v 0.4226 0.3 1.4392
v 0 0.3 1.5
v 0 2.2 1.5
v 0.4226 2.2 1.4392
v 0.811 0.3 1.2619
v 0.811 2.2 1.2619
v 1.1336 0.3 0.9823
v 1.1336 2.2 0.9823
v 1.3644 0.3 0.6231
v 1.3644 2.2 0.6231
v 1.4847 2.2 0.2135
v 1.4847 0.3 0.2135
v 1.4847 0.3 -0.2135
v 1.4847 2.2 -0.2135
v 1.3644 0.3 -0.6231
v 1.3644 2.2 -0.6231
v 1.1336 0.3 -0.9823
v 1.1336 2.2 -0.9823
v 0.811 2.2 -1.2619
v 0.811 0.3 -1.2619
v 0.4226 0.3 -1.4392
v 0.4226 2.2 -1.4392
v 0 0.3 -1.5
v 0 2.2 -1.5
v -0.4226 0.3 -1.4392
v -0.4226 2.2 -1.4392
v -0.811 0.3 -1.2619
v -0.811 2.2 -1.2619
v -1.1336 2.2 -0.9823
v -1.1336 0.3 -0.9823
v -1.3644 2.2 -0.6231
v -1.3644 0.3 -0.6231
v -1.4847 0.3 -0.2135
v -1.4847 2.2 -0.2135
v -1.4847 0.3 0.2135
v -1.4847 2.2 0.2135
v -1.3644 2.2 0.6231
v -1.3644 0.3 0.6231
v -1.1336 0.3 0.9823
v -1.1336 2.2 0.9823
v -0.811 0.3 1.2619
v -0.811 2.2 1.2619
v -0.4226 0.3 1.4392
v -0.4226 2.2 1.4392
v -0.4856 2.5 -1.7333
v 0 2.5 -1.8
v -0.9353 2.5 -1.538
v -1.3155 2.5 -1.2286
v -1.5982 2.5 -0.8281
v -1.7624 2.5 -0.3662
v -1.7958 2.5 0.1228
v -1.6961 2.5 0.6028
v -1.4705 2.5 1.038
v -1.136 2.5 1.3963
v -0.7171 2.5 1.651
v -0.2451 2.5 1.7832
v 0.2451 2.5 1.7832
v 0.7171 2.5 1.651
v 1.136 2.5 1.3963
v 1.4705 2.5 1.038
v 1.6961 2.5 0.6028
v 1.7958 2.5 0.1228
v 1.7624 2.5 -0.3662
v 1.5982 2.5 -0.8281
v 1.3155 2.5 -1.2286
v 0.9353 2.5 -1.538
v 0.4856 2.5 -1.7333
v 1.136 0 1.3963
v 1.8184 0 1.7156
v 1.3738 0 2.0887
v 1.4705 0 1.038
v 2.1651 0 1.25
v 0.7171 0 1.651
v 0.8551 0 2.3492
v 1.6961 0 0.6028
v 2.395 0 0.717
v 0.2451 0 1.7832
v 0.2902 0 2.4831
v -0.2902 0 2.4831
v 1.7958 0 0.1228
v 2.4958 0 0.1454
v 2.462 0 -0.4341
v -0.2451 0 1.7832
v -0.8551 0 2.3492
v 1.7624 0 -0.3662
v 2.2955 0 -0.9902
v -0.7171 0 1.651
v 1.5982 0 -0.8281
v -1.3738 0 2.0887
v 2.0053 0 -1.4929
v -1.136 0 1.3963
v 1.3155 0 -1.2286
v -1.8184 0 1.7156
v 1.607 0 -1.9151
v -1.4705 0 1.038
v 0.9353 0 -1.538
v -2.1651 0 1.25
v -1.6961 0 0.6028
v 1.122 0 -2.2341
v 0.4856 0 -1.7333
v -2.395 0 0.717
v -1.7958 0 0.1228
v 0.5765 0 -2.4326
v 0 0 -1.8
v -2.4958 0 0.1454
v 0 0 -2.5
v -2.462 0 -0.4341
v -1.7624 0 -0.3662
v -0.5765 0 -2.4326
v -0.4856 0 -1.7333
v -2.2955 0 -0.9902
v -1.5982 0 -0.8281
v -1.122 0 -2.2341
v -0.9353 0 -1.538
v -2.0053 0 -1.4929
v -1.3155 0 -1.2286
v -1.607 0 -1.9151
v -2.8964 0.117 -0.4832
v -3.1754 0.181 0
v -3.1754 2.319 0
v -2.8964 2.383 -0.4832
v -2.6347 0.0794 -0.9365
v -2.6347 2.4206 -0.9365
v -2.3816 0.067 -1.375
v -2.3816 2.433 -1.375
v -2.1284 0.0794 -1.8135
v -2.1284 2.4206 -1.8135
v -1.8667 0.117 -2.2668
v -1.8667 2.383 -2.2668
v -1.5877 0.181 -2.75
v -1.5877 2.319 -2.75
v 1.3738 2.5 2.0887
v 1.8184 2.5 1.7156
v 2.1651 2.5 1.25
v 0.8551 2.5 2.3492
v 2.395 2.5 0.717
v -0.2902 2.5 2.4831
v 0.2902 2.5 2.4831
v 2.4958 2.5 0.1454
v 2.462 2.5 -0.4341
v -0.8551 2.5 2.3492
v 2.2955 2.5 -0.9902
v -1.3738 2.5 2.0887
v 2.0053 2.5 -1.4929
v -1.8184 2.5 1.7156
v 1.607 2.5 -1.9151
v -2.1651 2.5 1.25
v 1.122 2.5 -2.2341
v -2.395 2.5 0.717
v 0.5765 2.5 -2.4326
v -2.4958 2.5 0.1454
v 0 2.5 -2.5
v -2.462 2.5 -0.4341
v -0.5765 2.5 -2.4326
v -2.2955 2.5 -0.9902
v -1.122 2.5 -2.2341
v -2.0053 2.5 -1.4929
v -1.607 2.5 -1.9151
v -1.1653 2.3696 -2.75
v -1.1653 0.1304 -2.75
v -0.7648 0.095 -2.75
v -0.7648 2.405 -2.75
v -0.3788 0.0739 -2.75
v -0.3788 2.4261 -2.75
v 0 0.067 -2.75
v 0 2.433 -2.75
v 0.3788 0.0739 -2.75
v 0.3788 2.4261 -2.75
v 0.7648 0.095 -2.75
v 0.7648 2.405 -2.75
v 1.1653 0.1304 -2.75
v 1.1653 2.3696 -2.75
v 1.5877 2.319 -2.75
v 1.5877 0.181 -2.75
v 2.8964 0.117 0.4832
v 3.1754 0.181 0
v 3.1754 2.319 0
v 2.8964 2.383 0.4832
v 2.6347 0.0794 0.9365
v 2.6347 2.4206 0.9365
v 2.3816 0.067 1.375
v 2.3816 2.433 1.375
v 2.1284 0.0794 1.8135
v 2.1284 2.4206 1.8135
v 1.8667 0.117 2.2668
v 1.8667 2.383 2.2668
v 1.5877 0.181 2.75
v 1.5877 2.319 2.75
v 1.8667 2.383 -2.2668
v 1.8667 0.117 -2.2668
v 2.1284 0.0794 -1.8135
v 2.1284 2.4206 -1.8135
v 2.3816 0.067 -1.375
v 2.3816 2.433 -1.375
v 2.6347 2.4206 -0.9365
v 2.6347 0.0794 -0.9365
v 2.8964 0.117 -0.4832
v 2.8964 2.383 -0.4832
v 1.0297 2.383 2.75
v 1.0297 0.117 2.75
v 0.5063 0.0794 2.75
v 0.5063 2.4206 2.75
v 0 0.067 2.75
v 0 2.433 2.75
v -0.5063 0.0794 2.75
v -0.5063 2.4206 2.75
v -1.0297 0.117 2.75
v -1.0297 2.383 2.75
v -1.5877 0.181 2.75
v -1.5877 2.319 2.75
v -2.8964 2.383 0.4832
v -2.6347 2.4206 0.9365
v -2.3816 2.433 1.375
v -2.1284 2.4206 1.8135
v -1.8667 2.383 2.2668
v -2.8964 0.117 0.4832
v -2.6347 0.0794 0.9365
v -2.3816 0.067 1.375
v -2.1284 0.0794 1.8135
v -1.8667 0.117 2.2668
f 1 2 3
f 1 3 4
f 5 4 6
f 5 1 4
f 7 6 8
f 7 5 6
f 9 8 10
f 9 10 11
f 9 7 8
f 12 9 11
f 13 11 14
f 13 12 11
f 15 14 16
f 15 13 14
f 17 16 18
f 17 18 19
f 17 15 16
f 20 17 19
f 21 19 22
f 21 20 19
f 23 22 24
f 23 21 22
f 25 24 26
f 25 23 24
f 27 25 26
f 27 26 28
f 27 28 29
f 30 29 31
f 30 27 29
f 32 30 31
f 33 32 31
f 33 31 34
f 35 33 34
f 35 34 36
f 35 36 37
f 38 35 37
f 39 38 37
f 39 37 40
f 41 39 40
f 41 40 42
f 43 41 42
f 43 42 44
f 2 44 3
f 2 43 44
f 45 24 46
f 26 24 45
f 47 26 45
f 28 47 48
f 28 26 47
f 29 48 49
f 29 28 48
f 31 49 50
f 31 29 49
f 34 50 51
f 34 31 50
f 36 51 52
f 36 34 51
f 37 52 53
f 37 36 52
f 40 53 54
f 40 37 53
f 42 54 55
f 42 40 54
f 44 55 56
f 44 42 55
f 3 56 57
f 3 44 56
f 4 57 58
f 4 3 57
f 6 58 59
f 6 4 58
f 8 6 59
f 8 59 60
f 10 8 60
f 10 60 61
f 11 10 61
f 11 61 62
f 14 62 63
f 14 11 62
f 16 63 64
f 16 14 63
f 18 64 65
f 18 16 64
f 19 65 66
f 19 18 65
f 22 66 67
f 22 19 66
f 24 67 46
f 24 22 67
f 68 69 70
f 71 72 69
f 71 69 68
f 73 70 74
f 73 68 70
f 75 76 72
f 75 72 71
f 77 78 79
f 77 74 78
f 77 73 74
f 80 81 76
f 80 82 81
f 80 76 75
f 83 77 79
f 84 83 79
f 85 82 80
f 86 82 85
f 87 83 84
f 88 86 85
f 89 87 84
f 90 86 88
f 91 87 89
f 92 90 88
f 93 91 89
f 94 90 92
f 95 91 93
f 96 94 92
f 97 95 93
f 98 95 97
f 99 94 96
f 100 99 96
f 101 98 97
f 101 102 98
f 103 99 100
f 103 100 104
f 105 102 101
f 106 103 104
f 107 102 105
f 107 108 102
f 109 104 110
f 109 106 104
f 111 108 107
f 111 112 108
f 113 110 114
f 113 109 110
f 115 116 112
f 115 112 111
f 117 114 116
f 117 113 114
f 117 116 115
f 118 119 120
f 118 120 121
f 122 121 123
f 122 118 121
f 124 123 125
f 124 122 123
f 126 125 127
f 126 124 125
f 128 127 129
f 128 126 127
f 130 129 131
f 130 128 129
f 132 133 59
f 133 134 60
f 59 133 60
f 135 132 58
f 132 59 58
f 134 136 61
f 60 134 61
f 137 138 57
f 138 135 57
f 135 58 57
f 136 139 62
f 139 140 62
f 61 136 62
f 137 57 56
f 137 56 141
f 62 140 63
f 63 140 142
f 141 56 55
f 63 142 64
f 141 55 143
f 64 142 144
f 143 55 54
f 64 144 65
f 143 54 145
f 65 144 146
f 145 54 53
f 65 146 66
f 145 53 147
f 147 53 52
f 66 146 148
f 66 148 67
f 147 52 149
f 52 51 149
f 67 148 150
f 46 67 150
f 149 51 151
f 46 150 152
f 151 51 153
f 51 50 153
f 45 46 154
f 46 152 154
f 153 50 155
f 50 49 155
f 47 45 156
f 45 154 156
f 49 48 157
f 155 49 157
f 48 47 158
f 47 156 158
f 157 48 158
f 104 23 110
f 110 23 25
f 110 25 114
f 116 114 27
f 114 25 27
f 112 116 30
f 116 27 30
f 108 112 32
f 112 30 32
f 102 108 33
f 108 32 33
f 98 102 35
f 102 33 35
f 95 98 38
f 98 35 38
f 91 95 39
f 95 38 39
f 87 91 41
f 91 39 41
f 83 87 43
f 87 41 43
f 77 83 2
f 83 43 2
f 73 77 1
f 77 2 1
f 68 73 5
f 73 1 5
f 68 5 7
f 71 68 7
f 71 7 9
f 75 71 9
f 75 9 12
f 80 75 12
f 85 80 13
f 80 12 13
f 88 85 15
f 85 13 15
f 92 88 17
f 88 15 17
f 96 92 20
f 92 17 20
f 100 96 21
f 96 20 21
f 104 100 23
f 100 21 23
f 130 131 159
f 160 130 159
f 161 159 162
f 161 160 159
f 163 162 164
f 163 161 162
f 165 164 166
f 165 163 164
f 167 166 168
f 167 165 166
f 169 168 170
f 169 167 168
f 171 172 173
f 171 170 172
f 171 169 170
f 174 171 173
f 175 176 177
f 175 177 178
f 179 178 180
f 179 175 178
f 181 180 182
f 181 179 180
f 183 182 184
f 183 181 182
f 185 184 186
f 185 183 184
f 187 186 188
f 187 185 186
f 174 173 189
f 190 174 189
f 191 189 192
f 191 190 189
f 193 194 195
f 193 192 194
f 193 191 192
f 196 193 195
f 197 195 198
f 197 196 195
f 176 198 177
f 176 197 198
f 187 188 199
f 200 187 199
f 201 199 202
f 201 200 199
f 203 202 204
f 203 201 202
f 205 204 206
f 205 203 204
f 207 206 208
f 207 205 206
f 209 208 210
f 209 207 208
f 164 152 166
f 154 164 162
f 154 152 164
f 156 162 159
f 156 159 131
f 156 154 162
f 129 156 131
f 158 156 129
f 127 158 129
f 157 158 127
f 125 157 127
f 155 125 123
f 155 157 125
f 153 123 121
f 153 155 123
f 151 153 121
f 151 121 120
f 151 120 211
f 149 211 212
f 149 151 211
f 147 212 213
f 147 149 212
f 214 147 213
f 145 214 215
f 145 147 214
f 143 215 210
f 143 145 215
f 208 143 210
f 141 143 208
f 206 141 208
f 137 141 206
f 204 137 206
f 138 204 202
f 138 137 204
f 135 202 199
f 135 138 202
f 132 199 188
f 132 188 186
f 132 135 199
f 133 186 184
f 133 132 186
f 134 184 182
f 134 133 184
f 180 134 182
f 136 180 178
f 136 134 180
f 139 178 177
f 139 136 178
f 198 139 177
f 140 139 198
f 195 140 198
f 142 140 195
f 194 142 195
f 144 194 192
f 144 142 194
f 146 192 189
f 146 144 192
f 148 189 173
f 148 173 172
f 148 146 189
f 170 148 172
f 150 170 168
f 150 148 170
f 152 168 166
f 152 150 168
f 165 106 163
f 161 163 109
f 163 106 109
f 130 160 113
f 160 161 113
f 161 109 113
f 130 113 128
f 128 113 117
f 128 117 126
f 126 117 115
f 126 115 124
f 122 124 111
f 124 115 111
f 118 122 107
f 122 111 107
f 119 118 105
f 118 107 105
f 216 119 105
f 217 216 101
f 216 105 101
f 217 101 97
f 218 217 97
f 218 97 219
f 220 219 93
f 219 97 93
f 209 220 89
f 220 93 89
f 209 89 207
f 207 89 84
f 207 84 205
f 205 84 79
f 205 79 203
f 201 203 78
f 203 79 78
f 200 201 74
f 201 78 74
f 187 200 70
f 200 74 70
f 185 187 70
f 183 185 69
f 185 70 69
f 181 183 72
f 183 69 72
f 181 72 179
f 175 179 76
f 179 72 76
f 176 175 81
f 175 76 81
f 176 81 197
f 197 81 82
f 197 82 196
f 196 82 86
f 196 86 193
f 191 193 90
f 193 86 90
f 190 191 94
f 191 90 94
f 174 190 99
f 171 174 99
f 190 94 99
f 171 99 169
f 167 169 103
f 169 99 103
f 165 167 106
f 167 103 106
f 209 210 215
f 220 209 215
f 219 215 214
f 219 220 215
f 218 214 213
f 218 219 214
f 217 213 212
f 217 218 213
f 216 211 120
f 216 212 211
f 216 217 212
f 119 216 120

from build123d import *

# Parameters (mm, degrees)
SKETCH1_R      = 1.5
EXTRUDE1_DEPTH = 2.5


with BuildPart() as part:
    # Sketch1 → Extrude1 (new body)
    with BuildSketch(Plane(origin=(0, 0, 0), x_dir=(1, 0, 0), z_dir=(0, 1, 0))):
        Polygon((-3.175426481, 0), (-1.58771324, 2.75), (1.58771324, 2.75), (3.175426481, 0), (1.58771324, -2.75), (-1.58771324, -2.75), align=None)
        with Locations(Location((0, 0, 0), (0, 0, 270))):  # turned: the seam where the file's is
            Circle(SKETCH1_R, mode=Mode.SUBTRACT)
    extrude(amount=EXTRUDE1_DEPTH)

    # Sketch2 → Cut-Revolve1 (revolve, cut)
    with BuildSketch(Plane.XY, mode=Mode.PRIVATE) as cut_revolve1_sk:
        Polygon((1.5, 2.5), (1.8, 2.5), (1.5, 2.2), align=None)
        Polygon((1.5, 0), (1.8, 0), (1.5, 0.3), align=None)
        Polygon((3.175426481, 0), (3.175426481, 0.18097998), (2.5, 0), align=None)
        Polygon((3.175426481, 2.5), (3.175426481, 2.31902002), (2.5, 2.5), align=None)
    revolve(cut_revolve1_sk.sketch.rotate(Axis((0, 0, 0), (0, 1, 0)), 90), axis=Axis((0, 0, 0), (0, 1, 0)), mode=Mode.SUBTRACT)  # turned: the seam where the file's is


solid = part.part
